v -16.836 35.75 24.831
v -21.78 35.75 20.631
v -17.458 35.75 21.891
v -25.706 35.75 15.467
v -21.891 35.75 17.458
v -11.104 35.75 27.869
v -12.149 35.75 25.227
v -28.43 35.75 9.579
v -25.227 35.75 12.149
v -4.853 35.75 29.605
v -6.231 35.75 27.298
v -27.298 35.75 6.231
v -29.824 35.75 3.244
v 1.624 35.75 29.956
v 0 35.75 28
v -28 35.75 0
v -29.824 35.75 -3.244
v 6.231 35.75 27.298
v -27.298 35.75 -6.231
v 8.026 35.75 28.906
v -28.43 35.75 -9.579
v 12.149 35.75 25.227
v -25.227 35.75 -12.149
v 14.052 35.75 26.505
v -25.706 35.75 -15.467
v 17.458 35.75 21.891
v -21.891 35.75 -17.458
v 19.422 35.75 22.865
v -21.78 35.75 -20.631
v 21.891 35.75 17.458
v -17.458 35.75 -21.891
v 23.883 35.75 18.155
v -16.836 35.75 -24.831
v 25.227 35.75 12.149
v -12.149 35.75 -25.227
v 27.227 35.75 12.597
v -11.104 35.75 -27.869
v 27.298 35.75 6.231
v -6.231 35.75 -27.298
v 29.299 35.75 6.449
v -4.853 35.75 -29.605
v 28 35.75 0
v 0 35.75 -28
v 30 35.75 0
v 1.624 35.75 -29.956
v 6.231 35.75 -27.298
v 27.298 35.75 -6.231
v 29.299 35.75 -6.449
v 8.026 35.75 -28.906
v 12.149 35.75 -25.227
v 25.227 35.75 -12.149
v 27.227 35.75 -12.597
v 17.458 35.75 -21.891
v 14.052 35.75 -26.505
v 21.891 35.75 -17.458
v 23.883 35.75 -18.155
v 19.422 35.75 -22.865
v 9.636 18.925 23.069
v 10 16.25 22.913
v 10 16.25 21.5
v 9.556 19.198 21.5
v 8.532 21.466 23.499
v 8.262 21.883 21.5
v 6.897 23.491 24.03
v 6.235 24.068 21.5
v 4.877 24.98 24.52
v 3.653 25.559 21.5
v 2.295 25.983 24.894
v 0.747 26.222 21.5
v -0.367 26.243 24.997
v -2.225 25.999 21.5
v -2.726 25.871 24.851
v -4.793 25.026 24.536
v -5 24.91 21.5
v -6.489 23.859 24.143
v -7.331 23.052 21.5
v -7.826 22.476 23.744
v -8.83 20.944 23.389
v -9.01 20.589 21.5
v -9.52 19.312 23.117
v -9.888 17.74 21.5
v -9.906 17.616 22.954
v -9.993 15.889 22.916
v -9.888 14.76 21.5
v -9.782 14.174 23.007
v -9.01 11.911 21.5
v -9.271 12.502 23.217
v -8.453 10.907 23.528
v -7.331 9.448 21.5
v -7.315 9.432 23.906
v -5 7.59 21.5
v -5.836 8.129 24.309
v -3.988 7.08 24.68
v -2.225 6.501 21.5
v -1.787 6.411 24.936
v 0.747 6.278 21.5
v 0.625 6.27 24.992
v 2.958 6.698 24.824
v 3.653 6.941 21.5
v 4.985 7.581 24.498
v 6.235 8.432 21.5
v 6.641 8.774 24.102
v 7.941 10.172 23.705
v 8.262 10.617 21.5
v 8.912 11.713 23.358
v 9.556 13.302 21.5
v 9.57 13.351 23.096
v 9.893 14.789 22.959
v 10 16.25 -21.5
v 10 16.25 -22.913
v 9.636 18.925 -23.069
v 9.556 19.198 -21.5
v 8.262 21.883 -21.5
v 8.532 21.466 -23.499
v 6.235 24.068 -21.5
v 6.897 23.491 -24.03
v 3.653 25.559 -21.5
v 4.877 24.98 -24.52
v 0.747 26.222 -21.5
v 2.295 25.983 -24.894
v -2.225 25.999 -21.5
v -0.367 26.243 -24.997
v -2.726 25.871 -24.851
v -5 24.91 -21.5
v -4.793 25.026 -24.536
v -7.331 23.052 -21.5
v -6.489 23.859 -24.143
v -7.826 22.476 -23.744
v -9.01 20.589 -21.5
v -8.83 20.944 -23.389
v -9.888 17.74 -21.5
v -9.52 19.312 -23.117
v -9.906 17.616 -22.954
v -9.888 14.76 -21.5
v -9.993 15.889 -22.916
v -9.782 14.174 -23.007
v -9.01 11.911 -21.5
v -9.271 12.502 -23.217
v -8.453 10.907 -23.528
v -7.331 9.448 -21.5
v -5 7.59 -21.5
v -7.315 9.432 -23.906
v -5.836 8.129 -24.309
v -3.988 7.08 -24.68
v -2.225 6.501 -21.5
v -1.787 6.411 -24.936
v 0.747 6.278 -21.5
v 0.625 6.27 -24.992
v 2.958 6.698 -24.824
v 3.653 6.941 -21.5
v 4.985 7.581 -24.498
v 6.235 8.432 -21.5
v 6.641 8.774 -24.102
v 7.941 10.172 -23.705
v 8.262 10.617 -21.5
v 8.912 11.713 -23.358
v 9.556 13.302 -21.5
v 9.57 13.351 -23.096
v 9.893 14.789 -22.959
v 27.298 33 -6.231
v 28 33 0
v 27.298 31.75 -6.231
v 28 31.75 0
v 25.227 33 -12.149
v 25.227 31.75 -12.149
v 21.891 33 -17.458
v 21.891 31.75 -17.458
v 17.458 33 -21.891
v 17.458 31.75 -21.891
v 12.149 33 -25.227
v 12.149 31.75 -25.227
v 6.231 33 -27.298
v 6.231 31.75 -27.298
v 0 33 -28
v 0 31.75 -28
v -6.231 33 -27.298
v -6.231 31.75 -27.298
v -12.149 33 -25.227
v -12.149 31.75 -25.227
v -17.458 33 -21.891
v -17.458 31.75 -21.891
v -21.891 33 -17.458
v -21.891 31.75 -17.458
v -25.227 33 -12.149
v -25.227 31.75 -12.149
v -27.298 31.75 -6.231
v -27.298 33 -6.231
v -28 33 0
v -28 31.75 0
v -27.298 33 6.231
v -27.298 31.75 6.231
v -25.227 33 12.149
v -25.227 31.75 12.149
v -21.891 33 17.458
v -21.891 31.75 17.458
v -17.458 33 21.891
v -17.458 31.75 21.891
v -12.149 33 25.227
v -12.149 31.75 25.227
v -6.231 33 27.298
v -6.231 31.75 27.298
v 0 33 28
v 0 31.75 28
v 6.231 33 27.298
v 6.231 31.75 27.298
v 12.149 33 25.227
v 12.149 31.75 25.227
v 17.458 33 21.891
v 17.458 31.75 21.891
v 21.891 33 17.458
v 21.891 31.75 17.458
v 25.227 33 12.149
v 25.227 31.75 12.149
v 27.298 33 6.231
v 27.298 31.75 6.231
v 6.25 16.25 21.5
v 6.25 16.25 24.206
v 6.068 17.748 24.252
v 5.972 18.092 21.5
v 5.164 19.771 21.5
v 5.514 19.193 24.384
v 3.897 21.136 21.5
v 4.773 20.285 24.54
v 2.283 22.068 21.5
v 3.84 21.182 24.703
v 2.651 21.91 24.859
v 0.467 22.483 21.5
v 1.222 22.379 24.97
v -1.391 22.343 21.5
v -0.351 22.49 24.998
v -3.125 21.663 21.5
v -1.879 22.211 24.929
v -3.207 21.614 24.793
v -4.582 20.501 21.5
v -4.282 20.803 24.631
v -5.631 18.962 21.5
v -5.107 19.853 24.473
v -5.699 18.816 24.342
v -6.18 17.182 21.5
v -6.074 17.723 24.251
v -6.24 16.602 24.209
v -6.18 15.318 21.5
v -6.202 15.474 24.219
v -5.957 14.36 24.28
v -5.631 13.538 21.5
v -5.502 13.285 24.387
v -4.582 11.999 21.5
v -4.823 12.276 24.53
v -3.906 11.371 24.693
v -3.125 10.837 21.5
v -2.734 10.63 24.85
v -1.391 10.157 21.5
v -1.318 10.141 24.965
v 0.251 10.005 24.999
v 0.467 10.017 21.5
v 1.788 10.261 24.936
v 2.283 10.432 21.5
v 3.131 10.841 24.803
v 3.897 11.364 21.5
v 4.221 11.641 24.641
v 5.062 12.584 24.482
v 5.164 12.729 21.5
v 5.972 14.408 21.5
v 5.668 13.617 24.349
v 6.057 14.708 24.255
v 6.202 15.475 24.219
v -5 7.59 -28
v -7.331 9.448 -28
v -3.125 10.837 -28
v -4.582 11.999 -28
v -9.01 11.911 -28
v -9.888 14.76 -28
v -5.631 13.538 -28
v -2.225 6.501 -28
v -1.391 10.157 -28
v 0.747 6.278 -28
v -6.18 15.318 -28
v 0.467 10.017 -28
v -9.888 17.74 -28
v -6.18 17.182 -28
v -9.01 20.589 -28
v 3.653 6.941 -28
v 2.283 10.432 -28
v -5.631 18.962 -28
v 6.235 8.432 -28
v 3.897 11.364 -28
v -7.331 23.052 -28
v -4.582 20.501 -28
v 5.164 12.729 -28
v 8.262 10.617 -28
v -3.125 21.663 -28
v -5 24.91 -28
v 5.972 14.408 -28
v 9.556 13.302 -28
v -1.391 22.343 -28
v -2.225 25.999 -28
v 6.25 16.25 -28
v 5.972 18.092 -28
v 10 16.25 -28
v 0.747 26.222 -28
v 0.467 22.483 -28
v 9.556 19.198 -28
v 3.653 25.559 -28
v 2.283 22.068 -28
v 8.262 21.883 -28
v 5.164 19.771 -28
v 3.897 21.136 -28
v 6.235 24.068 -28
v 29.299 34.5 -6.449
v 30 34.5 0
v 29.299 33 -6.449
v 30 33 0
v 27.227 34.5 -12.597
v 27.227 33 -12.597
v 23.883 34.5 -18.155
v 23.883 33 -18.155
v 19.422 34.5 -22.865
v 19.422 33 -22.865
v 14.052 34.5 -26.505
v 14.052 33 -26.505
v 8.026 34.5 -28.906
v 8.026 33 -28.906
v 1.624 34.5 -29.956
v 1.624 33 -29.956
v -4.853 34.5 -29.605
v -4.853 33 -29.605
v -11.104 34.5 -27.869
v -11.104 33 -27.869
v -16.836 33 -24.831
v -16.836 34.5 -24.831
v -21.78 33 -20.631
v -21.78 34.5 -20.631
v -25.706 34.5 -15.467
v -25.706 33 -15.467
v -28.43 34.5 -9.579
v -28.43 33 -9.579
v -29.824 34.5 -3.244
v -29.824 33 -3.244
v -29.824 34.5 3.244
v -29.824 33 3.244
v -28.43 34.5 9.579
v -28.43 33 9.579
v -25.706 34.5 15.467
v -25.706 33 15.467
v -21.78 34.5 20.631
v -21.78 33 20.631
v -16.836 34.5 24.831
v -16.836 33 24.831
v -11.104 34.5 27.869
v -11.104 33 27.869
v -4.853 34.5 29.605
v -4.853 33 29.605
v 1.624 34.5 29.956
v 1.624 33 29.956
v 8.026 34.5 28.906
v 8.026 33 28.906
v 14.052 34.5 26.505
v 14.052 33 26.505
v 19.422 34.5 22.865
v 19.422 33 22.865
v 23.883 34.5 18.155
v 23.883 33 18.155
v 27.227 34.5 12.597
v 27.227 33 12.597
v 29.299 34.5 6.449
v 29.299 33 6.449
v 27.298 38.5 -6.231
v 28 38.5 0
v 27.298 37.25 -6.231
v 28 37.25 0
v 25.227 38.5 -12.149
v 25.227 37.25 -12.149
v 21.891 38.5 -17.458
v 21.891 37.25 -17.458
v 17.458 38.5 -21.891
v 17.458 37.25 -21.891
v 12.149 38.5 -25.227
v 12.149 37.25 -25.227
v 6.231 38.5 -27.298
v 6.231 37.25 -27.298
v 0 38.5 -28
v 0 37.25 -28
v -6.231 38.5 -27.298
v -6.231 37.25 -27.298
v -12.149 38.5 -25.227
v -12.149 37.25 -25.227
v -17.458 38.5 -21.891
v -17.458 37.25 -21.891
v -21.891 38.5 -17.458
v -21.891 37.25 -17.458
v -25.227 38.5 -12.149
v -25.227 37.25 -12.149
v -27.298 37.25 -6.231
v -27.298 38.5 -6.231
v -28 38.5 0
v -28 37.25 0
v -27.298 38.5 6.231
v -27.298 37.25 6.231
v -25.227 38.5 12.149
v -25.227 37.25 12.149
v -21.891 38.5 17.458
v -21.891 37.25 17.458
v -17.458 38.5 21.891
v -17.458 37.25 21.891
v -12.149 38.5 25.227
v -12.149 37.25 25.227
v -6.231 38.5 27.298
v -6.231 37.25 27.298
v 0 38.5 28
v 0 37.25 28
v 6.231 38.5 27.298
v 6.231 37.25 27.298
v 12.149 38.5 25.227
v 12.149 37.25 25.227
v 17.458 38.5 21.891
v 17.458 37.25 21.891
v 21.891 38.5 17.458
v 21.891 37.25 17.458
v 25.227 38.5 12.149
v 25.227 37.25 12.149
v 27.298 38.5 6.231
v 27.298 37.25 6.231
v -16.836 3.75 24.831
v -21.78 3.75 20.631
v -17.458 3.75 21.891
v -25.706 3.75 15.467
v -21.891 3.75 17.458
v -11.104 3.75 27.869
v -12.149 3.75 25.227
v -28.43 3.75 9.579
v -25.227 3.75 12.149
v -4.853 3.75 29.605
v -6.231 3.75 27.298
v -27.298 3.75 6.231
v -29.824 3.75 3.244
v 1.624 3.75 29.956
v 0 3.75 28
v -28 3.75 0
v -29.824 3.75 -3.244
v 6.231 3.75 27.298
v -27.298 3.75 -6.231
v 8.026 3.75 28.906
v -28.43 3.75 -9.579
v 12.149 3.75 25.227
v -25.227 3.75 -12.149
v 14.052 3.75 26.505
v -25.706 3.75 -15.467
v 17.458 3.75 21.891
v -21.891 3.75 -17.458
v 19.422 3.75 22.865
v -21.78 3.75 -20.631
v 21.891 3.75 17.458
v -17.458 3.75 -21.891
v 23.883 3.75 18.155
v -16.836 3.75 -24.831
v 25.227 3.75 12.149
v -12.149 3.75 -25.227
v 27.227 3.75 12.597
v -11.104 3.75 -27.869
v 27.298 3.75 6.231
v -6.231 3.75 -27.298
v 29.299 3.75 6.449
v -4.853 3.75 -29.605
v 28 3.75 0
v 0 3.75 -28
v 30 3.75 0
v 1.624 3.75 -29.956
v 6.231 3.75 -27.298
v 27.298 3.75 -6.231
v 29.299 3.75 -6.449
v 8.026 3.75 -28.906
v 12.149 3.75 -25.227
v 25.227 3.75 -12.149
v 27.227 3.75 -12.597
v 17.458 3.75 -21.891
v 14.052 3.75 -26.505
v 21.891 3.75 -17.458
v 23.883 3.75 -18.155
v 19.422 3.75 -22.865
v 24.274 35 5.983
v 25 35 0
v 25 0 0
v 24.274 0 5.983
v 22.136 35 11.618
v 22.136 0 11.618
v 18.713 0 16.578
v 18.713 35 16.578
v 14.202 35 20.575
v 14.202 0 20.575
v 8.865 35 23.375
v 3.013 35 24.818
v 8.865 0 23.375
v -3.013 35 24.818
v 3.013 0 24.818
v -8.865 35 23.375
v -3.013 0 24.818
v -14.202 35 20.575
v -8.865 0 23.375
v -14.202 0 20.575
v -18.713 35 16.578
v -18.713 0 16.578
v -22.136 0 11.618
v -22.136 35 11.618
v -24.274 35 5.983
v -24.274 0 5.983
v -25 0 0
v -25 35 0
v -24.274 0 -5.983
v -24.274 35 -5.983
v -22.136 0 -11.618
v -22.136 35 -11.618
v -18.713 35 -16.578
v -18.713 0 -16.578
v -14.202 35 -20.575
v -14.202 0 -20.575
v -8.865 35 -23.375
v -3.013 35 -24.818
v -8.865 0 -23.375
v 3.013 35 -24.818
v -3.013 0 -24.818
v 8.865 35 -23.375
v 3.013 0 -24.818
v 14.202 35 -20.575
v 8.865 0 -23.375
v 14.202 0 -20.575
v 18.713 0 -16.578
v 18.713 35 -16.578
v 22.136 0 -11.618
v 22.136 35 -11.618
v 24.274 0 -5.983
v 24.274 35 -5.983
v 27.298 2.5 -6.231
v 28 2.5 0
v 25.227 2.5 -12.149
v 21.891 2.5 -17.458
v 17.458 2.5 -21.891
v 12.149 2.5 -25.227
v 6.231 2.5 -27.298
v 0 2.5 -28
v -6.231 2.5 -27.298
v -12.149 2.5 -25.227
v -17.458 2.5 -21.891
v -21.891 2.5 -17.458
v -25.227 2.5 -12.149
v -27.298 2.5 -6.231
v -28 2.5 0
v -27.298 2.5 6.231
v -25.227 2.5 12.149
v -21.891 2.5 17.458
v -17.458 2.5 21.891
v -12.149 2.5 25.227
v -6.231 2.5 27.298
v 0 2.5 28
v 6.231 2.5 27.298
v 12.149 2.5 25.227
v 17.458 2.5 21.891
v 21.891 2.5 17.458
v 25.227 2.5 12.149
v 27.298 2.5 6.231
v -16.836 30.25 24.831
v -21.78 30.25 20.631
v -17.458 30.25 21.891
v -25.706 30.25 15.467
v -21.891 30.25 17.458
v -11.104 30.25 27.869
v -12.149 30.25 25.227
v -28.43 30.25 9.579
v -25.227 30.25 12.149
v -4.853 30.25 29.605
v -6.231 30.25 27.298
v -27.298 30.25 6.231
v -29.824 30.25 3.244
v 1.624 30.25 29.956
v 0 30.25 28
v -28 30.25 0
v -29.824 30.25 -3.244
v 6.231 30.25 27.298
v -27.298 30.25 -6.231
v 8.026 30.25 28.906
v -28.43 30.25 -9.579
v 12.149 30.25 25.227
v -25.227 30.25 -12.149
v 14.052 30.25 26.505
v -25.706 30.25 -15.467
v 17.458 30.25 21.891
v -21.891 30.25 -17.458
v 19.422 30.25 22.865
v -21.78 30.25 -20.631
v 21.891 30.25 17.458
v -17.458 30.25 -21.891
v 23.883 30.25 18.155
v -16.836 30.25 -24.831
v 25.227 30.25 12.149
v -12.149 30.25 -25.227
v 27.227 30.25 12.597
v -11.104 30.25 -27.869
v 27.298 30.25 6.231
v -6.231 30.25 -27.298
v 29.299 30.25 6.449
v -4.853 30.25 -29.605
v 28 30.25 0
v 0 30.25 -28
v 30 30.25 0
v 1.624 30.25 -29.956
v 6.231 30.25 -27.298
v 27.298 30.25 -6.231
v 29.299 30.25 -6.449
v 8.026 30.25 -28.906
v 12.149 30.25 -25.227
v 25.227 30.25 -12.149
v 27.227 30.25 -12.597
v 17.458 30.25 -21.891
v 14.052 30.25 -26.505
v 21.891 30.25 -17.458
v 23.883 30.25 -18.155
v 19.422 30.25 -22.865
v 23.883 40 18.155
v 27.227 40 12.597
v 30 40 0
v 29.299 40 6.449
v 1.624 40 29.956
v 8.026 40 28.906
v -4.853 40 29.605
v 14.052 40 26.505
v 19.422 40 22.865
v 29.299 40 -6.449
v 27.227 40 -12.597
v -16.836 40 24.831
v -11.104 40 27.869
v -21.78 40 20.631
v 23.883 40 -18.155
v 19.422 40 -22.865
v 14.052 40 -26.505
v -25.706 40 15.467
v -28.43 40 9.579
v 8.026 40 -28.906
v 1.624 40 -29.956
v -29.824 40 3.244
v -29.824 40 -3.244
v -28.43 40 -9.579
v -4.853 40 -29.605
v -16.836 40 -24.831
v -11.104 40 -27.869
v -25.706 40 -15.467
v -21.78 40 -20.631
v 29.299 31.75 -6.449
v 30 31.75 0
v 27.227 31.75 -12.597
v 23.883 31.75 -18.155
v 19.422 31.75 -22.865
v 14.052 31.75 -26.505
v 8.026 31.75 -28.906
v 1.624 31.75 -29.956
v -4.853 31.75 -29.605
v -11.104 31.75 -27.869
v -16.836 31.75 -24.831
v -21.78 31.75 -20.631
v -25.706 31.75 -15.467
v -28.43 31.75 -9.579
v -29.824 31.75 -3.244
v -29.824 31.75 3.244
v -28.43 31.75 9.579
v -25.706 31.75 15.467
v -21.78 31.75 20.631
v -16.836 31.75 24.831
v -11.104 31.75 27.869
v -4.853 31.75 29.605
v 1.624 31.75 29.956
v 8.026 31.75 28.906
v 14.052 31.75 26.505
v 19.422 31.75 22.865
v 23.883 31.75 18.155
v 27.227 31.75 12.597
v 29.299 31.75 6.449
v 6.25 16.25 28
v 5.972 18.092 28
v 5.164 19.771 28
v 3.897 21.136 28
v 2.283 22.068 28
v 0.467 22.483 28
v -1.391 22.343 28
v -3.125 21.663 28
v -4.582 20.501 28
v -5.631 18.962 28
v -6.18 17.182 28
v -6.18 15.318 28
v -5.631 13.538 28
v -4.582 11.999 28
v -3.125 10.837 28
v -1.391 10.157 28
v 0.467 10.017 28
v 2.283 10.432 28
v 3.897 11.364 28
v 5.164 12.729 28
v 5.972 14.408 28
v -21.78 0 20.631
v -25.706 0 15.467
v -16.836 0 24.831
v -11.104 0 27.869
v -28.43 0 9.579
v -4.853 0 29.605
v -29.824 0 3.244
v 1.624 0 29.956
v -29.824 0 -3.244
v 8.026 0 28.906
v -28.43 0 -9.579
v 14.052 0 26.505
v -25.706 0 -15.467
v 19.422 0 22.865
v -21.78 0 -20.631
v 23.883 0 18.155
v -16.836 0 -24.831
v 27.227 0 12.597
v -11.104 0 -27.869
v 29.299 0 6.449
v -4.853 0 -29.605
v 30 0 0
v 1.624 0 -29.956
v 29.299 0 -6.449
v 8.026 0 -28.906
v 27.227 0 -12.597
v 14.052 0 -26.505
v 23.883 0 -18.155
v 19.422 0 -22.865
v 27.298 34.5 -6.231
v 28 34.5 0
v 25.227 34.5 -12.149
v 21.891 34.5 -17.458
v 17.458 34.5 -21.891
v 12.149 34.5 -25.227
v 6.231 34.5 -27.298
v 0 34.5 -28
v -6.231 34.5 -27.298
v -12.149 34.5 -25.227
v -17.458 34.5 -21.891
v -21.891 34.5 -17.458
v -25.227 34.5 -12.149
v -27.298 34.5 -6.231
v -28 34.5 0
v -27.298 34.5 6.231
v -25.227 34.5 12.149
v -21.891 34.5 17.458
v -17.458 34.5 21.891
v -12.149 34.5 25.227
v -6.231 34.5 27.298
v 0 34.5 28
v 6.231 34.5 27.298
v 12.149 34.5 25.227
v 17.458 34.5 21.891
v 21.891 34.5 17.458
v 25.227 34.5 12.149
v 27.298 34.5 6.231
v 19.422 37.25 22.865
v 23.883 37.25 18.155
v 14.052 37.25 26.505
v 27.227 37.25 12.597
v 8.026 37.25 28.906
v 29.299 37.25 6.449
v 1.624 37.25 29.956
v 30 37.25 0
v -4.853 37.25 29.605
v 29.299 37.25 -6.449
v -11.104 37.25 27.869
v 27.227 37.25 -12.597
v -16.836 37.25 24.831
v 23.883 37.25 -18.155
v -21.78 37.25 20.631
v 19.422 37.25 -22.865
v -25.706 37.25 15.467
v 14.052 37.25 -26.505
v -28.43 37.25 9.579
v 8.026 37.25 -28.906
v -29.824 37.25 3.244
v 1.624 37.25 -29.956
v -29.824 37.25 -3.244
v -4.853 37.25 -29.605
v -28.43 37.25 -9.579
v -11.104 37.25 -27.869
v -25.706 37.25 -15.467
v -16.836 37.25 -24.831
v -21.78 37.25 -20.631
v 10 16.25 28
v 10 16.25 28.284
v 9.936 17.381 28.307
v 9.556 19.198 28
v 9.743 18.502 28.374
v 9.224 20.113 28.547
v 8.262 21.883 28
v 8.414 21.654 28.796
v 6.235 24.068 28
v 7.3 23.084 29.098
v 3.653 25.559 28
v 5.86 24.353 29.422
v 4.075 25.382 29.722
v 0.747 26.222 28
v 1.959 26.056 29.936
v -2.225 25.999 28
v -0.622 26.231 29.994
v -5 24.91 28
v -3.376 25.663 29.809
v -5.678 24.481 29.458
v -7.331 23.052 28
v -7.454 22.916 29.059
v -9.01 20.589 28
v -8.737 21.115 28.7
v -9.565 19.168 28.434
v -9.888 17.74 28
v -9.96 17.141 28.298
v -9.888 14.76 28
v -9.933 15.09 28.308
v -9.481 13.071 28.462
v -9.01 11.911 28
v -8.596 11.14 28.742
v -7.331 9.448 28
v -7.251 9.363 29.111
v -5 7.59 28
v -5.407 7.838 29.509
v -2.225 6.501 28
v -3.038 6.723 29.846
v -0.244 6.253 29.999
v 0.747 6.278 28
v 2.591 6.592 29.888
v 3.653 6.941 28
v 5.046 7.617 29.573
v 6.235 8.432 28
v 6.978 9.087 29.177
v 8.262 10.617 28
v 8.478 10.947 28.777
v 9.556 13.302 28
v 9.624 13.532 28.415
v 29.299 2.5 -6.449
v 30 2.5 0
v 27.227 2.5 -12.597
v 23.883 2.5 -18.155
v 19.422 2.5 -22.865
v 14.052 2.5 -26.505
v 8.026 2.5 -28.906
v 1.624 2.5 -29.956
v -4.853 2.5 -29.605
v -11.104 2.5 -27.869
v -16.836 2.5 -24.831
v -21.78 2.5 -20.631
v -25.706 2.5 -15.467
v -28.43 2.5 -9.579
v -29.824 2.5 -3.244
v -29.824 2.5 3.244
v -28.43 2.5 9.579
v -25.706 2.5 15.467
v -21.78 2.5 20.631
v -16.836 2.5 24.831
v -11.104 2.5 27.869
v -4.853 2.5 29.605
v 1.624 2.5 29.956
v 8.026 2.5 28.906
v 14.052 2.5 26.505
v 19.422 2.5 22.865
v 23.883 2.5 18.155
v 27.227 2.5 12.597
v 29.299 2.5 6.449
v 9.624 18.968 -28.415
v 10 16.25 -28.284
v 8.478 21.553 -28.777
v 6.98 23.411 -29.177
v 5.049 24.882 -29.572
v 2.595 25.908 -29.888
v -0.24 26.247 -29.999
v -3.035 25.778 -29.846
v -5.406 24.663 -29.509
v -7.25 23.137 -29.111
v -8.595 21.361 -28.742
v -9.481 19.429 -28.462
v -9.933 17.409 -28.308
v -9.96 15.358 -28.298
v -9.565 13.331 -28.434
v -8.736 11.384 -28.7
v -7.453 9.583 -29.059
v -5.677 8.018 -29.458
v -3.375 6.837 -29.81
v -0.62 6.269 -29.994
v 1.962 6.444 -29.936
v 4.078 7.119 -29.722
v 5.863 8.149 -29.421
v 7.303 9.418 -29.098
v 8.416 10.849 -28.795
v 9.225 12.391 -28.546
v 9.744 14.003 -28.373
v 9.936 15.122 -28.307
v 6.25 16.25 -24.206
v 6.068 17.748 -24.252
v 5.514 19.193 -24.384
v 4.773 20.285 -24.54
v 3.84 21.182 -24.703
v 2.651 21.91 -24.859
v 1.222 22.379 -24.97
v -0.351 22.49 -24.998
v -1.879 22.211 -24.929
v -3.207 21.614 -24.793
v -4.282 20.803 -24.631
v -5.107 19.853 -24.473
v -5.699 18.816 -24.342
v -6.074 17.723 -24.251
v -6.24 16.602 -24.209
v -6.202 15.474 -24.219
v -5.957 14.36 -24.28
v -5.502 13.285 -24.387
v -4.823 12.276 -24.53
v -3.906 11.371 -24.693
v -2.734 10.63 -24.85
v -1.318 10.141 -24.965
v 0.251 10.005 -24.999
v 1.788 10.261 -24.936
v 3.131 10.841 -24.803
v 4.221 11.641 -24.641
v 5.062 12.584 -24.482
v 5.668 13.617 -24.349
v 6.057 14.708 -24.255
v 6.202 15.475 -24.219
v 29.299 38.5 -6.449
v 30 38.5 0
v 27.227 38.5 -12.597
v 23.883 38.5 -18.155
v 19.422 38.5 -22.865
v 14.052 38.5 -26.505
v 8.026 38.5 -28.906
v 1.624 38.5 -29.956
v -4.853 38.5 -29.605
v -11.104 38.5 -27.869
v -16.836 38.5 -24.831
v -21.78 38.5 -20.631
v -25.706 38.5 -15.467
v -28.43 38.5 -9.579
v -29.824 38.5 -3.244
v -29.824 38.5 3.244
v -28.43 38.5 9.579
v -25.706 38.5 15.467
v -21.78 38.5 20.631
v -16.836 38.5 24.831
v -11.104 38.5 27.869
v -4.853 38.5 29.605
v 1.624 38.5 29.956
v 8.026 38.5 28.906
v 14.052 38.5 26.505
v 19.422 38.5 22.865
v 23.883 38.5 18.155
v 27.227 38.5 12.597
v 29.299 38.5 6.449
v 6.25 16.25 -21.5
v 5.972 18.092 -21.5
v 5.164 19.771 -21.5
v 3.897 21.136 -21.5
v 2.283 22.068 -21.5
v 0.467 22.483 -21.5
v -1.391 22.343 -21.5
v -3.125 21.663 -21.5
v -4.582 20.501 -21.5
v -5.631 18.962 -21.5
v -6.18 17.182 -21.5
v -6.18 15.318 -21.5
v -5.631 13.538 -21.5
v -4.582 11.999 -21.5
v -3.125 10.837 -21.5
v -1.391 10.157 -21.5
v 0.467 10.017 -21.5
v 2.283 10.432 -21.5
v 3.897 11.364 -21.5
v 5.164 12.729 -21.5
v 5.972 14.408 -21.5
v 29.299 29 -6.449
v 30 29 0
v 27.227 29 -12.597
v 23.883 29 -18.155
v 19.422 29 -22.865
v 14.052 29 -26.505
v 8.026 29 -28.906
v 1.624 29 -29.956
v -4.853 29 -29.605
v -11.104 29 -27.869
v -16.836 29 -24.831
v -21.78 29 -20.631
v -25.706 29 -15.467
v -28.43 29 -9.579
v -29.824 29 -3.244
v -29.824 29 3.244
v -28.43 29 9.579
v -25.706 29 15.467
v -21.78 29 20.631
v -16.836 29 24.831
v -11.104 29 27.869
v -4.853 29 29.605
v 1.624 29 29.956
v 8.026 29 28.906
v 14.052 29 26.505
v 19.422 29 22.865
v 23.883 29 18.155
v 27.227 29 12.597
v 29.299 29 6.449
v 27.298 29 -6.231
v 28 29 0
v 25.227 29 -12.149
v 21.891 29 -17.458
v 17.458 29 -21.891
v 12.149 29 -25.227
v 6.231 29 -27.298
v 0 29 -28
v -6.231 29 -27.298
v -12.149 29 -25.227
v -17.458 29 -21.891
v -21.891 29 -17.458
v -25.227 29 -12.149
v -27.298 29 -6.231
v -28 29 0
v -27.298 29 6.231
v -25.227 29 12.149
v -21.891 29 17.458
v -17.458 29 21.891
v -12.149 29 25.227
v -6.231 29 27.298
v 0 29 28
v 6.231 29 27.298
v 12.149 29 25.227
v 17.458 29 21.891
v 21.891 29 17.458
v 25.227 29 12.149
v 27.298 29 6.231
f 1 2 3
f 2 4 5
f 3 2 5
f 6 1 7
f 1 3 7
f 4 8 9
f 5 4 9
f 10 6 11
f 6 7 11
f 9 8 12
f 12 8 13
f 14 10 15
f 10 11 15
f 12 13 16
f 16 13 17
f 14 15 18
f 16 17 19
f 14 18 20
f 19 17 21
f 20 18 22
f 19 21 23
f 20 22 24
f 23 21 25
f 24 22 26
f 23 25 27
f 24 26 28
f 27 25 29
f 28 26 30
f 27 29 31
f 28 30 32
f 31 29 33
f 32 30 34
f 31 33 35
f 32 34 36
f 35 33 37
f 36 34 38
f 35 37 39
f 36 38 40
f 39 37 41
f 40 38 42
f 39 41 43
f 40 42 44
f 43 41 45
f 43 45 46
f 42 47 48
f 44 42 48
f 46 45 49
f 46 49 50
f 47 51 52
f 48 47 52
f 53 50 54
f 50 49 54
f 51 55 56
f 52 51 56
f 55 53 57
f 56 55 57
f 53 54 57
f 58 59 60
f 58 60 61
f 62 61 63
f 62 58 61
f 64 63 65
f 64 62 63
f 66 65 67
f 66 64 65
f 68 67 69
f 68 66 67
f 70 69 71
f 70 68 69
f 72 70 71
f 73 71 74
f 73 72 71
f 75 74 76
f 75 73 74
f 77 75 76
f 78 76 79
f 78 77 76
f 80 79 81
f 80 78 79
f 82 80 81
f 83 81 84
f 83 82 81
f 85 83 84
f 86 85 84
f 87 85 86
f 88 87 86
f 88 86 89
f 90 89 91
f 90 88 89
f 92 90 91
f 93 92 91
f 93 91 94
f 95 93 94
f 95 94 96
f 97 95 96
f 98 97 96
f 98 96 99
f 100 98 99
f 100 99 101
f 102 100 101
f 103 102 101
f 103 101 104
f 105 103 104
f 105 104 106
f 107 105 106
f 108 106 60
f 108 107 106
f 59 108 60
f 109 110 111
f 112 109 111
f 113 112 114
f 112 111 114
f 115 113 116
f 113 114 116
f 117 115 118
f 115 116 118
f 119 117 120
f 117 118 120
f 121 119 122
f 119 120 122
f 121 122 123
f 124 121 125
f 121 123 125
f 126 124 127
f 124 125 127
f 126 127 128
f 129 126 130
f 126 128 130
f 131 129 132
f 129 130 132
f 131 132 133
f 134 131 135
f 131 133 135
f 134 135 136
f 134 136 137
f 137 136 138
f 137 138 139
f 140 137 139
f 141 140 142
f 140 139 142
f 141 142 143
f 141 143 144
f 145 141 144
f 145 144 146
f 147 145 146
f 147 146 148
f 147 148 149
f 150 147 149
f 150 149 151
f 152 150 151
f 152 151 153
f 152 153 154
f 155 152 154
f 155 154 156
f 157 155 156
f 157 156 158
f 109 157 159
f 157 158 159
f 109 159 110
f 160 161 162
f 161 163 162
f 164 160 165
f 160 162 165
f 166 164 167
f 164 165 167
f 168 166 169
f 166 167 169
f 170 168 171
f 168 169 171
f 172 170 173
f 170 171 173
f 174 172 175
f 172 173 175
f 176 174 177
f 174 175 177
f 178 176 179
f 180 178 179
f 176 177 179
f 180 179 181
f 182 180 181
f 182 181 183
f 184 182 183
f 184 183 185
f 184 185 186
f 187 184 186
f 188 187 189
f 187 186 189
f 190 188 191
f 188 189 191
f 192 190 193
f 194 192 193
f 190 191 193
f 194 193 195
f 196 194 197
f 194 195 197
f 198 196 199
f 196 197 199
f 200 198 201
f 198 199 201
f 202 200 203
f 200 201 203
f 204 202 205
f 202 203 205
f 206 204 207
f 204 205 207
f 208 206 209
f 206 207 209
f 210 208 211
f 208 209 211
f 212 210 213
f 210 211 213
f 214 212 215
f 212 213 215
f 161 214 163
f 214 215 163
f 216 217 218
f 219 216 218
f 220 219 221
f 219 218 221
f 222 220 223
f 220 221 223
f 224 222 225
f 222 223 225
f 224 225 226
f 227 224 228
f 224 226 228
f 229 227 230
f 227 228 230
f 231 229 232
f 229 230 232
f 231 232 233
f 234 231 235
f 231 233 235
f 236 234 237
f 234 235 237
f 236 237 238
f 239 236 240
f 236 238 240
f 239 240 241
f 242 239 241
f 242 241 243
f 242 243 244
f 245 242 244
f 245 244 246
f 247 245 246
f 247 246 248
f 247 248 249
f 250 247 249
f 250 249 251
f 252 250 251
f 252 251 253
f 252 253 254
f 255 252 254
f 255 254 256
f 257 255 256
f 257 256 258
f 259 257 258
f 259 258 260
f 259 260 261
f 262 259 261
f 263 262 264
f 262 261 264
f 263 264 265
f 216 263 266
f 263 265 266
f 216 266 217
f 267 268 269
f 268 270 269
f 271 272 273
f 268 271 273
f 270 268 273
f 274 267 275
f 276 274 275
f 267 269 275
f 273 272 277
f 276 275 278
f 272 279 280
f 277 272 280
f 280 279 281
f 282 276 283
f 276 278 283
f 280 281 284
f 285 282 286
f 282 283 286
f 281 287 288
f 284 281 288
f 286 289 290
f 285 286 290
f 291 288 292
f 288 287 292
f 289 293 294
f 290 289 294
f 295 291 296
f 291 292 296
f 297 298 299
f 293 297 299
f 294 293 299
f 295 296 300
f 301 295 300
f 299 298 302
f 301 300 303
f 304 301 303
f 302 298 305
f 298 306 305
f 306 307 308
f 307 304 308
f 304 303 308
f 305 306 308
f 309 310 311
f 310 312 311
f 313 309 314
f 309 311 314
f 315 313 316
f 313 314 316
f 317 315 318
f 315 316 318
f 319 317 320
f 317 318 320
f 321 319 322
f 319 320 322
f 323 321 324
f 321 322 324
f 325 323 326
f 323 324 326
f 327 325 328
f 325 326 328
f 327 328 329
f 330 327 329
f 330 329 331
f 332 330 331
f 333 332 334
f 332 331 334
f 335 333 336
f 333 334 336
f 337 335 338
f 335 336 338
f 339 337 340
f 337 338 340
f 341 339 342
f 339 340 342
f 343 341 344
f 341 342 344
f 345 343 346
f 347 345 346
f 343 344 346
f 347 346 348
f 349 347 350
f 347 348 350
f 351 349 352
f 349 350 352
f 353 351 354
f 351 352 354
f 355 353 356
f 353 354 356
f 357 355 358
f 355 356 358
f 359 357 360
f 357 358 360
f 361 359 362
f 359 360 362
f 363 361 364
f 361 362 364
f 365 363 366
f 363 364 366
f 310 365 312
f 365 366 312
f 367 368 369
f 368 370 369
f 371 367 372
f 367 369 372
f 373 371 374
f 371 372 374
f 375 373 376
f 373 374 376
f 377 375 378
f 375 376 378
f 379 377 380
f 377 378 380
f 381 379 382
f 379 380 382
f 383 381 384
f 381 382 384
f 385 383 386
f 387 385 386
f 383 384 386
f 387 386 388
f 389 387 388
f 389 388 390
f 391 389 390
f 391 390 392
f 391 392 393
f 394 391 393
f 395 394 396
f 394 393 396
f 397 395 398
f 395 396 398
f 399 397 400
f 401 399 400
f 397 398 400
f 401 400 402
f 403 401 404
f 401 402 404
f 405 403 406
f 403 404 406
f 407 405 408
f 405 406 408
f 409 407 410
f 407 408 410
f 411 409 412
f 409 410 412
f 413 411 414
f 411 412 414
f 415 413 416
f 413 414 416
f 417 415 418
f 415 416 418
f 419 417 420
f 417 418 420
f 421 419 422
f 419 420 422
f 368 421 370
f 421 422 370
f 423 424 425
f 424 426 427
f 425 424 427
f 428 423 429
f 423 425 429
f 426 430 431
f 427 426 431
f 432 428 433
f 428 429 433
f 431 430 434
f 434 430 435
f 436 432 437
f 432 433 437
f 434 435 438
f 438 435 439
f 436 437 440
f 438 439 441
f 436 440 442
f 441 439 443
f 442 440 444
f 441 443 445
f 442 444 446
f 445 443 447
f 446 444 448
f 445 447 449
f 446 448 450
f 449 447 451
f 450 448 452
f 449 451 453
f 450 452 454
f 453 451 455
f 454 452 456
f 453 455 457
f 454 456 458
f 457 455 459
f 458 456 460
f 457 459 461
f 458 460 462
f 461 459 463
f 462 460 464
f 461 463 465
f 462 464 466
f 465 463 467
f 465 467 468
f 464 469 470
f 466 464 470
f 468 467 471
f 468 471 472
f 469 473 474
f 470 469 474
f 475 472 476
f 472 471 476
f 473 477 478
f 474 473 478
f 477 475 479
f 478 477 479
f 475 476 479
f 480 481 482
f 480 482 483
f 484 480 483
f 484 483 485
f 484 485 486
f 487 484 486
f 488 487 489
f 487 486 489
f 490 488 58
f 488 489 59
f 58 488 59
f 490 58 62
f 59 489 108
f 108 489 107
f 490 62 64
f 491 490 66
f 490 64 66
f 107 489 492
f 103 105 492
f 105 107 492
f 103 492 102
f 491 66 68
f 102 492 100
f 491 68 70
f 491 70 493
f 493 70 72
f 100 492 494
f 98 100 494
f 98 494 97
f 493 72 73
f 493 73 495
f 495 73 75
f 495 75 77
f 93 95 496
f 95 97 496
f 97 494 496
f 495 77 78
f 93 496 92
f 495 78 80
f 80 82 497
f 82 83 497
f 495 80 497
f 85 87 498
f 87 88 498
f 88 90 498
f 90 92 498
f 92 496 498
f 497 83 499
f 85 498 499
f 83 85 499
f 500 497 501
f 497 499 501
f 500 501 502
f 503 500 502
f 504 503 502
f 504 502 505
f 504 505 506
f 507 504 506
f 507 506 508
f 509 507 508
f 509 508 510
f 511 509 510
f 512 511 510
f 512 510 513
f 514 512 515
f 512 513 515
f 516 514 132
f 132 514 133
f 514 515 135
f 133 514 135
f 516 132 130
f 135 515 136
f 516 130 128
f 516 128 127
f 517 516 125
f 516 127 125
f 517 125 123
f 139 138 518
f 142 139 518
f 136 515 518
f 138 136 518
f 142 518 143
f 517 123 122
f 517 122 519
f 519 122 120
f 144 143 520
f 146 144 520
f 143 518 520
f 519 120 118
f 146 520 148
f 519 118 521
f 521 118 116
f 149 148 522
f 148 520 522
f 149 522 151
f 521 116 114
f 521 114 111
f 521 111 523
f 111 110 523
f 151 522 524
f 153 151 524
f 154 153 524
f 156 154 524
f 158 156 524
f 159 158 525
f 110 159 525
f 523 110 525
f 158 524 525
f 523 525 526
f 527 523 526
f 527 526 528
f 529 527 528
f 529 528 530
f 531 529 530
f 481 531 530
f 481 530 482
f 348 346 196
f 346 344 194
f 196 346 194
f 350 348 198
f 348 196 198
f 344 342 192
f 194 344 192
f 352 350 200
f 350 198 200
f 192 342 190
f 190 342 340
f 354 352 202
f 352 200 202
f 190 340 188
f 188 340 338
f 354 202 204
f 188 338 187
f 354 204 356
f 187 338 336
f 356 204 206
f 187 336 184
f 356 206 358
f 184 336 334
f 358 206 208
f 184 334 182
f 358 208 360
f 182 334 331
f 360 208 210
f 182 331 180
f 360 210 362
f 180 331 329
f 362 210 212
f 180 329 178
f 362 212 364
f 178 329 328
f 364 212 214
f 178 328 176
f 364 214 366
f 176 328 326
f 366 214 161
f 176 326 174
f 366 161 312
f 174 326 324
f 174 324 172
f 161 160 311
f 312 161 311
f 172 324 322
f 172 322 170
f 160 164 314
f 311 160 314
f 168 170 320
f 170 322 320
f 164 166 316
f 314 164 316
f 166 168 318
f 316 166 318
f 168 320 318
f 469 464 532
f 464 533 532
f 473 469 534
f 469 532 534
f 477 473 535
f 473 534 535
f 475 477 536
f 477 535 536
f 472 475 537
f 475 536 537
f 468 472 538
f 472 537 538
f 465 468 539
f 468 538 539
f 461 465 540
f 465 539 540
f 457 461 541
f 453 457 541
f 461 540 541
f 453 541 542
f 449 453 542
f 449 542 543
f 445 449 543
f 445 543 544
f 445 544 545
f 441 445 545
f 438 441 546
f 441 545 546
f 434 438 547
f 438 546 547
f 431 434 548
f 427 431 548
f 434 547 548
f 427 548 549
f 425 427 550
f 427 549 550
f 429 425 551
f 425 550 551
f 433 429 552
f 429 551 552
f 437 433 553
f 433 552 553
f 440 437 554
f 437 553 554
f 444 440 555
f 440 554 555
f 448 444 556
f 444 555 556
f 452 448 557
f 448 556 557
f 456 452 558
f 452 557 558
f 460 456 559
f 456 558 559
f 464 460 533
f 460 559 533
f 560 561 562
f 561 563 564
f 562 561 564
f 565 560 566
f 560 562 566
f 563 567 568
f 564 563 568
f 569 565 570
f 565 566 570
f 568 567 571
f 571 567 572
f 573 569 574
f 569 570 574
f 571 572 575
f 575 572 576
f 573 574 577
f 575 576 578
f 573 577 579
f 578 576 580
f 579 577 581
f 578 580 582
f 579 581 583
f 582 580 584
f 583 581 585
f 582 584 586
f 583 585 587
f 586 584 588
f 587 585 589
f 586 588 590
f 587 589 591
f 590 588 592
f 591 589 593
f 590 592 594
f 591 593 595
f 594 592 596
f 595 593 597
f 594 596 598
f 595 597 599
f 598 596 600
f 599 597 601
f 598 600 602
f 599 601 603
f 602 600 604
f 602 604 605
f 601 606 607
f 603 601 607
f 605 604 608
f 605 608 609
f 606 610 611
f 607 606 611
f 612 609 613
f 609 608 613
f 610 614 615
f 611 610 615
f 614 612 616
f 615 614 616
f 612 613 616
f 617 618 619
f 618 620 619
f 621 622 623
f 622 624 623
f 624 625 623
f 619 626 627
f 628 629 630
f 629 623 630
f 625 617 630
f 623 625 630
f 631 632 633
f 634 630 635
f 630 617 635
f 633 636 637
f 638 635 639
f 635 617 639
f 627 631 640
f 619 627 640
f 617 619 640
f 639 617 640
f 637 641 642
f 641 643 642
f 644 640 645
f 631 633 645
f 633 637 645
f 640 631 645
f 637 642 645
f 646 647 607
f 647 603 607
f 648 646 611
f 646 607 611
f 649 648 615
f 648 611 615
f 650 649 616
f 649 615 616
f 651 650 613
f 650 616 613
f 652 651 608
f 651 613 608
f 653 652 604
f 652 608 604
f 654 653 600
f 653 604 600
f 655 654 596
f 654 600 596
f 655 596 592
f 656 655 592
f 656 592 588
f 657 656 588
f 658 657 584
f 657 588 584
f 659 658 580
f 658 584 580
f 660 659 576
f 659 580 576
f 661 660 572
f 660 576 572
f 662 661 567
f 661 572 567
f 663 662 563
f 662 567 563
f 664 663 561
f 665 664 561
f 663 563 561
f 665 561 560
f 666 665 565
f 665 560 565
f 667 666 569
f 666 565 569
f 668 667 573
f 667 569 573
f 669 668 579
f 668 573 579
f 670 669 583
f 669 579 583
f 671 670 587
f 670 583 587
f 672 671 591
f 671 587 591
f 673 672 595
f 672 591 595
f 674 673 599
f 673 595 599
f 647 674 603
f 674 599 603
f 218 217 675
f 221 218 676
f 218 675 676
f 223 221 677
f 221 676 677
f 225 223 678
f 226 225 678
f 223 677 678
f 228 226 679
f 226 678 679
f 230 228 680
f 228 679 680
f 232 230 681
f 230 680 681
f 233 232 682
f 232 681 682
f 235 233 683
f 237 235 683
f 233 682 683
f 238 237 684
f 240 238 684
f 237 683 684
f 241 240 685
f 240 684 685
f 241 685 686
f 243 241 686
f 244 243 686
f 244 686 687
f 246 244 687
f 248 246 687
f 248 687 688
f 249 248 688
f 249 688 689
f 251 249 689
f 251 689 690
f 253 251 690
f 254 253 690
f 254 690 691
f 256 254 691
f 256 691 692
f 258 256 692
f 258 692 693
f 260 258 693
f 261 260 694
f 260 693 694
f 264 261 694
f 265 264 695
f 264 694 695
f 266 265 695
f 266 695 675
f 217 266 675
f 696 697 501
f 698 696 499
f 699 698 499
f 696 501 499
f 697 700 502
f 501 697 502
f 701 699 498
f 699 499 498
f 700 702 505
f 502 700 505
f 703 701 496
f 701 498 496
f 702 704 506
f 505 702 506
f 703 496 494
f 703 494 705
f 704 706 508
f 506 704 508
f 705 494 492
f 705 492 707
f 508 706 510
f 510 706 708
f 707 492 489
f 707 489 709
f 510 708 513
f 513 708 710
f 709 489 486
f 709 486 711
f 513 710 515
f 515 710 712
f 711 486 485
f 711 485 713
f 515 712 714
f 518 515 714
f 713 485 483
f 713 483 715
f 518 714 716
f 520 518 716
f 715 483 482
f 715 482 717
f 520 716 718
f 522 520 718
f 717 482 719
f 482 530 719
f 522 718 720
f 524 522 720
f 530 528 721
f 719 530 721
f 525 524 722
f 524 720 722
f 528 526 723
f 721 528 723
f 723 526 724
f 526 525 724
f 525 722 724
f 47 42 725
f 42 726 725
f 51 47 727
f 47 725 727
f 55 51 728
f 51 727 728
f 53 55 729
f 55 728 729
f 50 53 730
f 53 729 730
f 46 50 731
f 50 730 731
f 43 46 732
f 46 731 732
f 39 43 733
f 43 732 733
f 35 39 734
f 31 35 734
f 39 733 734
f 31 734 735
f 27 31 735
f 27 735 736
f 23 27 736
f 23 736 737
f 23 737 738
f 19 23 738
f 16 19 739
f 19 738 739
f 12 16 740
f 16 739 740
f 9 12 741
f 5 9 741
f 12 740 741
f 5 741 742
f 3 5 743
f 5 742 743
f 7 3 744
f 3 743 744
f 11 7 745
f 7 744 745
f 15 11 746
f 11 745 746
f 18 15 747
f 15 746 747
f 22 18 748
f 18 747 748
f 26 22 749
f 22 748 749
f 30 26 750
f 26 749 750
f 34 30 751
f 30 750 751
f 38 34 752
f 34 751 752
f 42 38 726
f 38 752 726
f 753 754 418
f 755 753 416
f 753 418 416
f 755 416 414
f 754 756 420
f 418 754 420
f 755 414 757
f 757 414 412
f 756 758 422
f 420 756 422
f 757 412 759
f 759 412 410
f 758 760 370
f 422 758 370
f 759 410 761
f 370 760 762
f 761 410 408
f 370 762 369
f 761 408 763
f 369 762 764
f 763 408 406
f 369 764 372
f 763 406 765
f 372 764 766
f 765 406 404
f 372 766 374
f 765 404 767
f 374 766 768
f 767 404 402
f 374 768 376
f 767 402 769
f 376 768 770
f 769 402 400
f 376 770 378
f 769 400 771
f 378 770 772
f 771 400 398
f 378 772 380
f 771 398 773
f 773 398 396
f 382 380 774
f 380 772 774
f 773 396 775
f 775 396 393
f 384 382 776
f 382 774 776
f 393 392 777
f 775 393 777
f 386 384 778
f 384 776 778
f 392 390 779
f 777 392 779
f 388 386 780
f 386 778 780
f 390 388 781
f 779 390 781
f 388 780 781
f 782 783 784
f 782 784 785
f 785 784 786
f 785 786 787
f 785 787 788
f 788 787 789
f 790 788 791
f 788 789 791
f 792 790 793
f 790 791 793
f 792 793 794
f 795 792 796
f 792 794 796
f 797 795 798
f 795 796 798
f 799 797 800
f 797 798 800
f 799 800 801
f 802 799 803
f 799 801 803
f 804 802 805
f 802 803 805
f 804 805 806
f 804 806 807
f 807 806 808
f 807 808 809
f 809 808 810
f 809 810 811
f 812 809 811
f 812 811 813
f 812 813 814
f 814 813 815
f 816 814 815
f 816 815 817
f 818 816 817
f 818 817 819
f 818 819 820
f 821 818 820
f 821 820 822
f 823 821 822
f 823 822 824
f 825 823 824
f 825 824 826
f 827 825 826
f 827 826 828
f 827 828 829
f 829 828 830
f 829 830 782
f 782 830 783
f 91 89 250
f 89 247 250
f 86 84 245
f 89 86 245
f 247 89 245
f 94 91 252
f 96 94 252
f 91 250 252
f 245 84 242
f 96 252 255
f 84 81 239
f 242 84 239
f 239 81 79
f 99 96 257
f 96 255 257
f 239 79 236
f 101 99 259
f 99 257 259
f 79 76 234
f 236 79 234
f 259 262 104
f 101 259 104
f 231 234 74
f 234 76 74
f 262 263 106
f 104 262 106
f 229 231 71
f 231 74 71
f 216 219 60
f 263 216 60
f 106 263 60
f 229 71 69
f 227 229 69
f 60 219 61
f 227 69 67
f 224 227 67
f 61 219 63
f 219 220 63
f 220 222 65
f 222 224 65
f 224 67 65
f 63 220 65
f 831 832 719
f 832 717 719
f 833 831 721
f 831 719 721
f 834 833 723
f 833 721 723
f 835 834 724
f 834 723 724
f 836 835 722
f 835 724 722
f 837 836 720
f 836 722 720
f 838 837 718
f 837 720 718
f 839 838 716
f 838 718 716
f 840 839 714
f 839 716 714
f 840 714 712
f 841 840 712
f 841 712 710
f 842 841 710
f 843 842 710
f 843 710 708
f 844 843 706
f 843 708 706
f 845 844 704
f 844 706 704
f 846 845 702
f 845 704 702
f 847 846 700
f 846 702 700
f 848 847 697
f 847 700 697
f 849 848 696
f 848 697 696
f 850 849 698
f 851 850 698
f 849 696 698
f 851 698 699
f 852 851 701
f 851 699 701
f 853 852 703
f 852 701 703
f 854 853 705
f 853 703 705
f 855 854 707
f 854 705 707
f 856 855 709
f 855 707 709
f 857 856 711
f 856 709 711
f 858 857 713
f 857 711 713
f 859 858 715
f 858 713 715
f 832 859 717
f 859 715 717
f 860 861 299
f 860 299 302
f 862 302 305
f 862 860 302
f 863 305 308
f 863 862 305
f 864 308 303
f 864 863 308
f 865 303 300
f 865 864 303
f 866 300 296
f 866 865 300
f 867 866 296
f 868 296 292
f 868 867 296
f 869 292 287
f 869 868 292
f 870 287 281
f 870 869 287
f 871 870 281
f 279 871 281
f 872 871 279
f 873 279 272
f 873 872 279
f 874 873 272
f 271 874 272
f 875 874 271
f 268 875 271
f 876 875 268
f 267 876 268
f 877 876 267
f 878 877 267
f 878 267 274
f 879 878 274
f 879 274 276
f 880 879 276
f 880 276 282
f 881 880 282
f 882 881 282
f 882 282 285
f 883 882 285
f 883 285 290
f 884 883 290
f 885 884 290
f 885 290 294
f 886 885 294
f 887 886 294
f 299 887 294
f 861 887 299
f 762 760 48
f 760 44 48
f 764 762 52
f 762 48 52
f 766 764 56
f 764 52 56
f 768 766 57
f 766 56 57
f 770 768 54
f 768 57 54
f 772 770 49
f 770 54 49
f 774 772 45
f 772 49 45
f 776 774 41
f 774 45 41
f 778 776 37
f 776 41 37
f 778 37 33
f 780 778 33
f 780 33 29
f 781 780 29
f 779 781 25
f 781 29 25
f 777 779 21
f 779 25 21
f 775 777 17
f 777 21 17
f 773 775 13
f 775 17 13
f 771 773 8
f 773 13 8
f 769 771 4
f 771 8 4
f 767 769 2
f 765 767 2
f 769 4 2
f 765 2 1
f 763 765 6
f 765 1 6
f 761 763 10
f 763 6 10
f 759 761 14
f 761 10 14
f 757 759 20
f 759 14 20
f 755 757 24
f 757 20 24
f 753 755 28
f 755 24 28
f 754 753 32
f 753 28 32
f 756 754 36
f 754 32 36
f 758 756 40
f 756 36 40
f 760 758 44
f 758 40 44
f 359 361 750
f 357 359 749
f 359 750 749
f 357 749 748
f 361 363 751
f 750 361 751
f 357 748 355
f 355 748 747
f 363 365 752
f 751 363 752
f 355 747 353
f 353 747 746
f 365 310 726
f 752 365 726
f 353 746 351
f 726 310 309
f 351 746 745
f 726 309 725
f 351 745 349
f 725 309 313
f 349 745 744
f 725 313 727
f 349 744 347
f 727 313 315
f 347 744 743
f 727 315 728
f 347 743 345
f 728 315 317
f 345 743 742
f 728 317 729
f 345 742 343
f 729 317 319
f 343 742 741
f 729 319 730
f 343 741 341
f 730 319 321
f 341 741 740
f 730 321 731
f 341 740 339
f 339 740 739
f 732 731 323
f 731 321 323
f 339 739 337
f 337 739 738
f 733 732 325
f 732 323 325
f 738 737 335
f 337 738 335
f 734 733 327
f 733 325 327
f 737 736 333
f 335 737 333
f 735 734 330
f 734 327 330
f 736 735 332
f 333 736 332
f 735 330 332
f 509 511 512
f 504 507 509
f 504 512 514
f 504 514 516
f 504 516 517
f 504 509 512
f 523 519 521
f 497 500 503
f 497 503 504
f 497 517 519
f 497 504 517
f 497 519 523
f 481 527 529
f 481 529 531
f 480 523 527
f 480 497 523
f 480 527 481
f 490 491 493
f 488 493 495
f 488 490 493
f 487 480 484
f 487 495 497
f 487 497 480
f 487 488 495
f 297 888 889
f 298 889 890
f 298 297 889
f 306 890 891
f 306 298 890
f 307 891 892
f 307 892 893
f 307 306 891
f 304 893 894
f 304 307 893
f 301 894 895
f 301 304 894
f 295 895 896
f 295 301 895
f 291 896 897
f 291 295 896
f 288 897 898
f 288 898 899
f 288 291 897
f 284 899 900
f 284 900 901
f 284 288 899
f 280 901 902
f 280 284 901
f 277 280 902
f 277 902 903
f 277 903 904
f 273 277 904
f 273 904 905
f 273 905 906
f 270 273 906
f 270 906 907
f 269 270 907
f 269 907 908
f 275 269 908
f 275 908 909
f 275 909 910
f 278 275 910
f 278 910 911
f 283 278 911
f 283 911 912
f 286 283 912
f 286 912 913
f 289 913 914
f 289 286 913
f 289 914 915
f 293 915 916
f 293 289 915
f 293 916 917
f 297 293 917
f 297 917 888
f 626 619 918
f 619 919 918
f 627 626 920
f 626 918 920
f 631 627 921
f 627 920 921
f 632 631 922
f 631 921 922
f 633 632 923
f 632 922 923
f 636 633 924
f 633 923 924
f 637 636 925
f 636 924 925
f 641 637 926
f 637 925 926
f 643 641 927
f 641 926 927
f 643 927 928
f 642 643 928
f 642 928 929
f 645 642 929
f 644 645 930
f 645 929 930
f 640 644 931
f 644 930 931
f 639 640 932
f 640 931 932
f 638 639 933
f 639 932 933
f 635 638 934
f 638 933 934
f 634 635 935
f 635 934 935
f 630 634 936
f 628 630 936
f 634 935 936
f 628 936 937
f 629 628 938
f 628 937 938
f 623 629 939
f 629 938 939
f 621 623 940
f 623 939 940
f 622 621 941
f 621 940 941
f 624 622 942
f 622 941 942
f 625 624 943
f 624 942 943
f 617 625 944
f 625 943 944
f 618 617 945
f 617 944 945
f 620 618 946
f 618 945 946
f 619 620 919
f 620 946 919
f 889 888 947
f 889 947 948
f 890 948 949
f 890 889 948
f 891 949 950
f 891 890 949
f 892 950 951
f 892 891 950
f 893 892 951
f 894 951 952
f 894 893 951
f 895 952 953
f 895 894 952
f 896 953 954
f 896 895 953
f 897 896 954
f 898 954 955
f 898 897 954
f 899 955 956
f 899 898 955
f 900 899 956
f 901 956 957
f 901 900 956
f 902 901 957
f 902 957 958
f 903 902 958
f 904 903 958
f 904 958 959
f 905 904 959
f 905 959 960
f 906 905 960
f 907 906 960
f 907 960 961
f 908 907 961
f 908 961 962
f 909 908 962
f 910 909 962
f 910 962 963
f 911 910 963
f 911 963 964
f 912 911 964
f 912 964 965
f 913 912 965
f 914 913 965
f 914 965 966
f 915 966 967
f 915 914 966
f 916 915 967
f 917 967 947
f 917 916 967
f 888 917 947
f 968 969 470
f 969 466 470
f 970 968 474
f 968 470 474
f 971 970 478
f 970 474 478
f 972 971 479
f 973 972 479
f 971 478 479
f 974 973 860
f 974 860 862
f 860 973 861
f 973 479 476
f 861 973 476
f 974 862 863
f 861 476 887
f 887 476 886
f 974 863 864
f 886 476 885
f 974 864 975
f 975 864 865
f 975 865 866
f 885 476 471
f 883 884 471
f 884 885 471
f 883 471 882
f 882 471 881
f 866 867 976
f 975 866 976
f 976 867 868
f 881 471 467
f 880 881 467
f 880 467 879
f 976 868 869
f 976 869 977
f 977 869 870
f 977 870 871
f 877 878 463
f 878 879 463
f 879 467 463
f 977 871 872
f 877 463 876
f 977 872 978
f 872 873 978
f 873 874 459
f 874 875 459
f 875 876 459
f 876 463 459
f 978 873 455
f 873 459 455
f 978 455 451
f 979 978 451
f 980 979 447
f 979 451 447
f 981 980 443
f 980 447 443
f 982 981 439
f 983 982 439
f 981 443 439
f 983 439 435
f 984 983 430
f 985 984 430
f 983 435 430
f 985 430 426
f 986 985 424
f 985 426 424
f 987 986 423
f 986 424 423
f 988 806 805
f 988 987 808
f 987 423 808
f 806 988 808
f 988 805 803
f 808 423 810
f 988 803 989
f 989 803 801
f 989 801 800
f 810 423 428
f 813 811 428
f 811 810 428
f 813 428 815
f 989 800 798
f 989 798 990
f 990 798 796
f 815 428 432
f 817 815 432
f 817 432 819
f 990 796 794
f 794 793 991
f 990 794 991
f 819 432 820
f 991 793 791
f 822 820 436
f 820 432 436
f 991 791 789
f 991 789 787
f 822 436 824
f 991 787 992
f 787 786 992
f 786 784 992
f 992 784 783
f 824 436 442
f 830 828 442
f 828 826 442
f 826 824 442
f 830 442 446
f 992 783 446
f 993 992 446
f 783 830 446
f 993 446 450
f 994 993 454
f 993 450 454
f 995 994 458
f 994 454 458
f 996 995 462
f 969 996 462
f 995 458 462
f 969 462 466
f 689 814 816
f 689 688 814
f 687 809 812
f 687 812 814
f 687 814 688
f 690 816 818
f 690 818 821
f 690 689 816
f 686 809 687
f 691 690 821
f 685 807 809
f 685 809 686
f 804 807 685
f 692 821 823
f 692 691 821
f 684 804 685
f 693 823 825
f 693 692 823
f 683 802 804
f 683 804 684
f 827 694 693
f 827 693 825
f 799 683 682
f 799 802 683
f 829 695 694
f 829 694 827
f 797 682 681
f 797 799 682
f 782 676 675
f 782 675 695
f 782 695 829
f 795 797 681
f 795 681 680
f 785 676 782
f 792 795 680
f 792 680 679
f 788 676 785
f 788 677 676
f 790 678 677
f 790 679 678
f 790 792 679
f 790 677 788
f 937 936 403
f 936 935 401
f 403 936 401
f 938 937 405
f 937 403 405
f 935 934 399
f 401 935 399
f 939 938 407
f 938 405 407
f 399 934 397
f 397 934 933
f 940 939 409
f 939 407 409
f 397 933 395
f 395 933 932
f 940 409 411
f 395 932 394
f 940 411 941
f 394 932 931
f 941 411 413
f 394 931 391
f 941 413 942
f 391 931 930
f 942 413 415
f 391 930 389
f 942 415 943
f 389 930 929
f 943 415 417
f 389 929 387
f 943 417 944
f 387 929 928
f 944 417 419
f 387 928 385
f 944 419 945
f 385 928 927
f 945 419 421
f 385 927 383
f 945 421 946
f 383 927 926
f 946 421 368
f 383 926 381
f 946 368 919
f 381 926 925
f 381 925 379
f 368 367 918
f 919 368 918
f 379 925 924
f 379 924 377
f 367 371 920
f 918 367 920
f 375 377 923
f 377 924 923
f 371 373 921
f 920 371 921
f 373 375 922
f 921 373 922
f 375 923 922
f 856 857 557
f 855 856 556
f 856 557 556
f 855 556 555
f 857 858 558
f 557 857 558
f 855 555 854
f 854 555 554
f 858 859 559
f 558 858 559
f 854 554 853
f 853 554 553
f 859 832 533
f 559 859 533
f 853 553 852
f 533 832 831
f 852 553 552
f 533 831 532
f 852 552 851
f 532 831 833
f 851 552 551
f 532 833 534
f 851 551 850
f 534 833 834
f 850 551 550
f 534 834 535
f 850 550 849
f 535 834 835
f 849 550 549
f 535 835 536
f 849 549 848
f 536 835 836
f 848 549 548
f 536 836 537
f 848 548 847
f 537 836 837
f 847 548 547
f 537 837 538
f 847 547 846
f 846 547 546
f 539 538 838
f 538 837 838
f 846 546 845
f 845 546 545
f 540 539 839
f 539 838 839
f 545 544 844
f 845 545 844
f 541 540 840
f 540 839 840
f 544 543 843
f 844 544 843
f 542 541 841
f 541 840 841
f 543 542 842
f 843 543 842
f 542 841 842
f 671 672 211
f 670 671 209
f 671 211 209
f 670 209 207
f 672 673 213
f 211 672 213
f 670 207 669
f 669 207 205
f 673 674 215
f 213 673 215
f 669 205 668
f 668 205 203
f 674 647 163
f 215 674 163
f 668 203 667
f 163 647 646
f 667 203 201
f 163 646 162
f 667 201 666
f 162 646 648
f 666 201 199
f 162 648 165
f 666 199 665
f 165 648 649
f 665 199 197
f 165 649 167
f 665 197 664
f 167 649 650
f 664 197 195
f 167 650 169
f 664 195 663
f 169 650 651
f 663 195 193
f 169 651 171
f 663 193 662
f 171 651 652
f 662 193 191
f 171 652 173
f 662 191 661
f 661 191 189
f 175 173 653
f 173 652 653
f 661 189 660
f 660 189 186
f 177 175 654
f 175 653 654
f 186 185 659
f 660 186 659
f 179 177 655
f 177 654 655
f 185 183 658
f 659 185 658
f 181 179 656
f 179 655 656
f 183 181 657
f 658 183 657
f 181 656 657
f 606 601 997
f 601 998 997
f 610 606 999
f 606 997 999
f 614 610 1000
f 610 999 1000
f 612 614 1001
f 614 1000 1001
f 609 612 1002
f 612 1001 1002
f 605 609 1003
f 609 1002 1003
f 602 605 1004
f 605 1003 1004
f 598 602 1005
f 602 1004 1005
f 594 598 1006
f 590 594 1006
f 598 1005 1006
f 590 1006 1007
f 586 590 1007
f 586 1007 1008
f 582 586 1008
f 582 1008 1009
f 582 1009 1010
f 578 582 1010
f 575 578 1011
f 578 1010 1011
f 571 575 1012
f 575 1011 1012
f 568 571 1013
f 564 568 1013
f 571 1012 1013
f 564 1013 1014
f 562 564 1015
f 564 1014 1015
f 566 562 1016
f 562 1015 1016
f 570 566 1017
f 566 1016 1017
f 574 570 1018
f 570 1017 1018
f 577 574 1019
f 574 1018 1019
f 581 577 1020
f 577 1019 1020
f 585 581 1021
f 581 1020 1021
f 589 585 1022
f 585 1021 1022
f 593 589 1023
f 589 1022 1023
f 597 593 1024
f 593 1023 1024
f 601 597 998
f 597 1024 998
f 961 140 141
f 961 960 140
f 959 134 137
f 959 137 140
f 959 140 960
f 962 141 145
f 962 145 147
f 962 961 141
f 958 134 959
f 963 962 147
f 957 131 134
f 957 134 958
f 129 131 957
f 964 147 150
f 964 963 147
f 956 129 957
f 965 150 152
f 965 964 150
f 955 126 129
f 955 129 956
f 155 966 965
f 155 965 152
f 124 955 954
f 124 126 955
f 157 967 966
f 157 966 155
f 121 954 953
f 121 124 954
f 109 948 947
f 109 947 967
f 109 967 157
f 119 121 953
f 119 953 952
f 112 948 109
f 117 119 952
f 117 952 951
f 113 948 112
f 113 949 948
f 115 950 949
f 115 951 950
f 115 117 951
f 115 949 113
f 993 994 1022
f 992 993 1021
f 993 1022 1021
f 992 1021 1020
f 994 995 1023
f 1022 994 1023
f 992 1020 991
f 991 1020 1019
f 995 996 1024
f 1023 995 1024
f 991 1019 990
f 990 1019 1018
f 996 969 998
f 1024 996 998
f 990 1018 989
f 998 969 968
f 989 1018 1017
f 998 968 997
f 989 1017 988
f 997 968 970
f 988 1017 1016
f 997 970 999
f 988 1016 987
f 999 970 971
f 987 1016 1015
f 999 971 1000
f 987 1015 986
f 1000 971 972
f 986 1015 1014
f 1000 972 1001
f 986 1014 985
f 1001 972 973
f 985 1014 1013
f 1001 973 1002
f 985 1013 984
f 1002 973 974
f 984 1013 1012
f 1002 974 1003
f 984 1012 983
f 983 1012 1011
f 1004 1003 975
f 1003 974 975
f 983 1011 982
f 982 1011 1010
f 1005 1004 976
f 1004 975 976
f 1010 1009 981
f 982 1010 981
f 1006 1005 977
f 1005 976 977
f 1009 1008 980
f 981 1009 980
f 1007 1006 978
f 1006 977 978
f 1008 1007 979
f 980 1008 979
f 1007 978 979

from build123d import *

# Parameters (mm, degrees)
SKETCH2_R               = 25
CUT_EXTRUDE1_DEPTH      = 35
SKETCH3_R               = 10
SKETCH3_R_2             = 6.25
CUT_EXTRUDE2_DEPTH      = 2
CUT_EXTRUDE3_REACH      = 80.102
CUT_EXTRUDE3_END_RADIUS = 25
SKETCH3_2_R             = 6.25
BOSS_EXTRUDE1_START     = -2
SKETCH3_3_R             = 10
SKETCH3_3_R_2           = 6.25
BOSS_EXTRUDE1_DEPTH     = 6.5
BOSS_EXTRUDE2_START     = -58
SKETCH3_4_R             = 10
SKETCH3_4_R_2           = 6.25
BOSS_EXTRUDE2_DEPTH     = 6.5


with BuildPart() as part:
    # Sketch1 → Revolve1 (revolve)
    with BuildSketch(Plane.XY, mode=Mode.PRIVATE) as revolve1_sk:
        Polygon((-30, 0), (0, 0), (0, 40), (-30, 40), (-30, 38.5), (-28, 38.5), (-28, 37.25), (-30, 37.25), (-30, 35.75), (-28, 35.75), (-28, 34.5), (-30, 34.5), (-30, 33), (-28, 33), (-28, 31.75), (-30, 31.75), (-30, 30.25), (-28, 30.25), (-28, 29), (-30, 29), (-30, 3.75), (-28, 3.75), (-28, 2.5), (-30, 2.5), align=None)
    revolve(revolve1_sk.sketch.rotate(Axis((0, 0, 0), (0, 1, 0)), 180), axis=Axis((0, 0, 0), (0, 1, 0)))

    # Sketch2 → Cut-Extrude1 (cut)
    with BuildSketch(Plane.XZ):
        Circle(SKETCH2_R)
    extrude(amount=-CUT_EXTRUDE1_DEPTH, mode=Mode.SUBTRACT)

    # Sketch3 → Cut-Extrude2 (cut)
    with BuildSketch(Plane.XY.offset(30)):
        with Locations((0, 16.25)):
            Circle(SKETCH3_R)
        with Locations((0, 16.25)):
            Circle(SKETCH3_R_2, mode=Mode.SUBTRACT)
    cut_extrude2 = extrude(amount=-CUT_EXTRUDE2_DEPTH, mode=Mode.SUBTRACT)

    # Cut-Extrude3: up to this cylinder (the profile starts outside it)
    cut_extrude3_end = Plane(origin=(0, 16.25, 0), z_dir=(0, -1, 0)) * Cylinder(CUT_EXTRUDE3_END_RADIUS, 211.204, mode=Mode.PRIVATE)
    # Sketch3<2> → Cut-Extrude3 (cut, up to the surface)
    with BuildSketch(Plane.XY.offset(30), mode=Mode.PRIVATE) as cut_extrude3_sk1:
        with Locations((0, 16.25)):
            Circle(SKETCH3_2_R)
    cut_extrude3_tool1 = extrude(cut_extrude3_sk1.sketch, amount=-CUT_EXTRUDE3_REACH, mode=Mode.PRIVATE) - cut_extrude3_end
    cut_extrude3 = cut_extrude3_tool1.solids().sort_by_distance((0, 16.25, 30))[0]
    add(cut_extrude3, mode=Mode.SUBTRACT)

    # Sketch3<3> → Boss-Extrude1 (add)
    with BuildSketch(Plane.XY.offset(30).offset(BOSS_EXTRUDE1_START)):
        with Locations((0, 16.25)):
            Circle(SKETCH3_3_R)
        with Locations((0, 16.25)):
            Circle(SKETCH3_3_R_2, mode=Mode.SUBTRACT)
    extrude(amount=-BOSS_EXTRUDE1_DEPTH)

    # Mirror1: Cut-Extrude2, Cut-Extrude3 across plane
    add(cut_extrude2.mirror(Plane.XY), mode=Mode.SUBTRACT)
    add(cut_extrude3.mirror(Plane.XY), mode=Mode.SUBTRACT)

    # Sketch3<4> → Boss-Extrude2 (add)
    with BuildSketch(Plane.XY.offset(30).offset(BOSS_EXTRUDE2_START)):
        with Locations((0, 16.25)):
            Circle(SKETCH3_4_R)
        with Locations((0, 16.25)):
            Circle(SKETCH3_4_R_2, mode=Mode.SUBTRACT)
    extrude(amount=BOSS_EXTRUDE2_DEPTH)


solid = part.part
